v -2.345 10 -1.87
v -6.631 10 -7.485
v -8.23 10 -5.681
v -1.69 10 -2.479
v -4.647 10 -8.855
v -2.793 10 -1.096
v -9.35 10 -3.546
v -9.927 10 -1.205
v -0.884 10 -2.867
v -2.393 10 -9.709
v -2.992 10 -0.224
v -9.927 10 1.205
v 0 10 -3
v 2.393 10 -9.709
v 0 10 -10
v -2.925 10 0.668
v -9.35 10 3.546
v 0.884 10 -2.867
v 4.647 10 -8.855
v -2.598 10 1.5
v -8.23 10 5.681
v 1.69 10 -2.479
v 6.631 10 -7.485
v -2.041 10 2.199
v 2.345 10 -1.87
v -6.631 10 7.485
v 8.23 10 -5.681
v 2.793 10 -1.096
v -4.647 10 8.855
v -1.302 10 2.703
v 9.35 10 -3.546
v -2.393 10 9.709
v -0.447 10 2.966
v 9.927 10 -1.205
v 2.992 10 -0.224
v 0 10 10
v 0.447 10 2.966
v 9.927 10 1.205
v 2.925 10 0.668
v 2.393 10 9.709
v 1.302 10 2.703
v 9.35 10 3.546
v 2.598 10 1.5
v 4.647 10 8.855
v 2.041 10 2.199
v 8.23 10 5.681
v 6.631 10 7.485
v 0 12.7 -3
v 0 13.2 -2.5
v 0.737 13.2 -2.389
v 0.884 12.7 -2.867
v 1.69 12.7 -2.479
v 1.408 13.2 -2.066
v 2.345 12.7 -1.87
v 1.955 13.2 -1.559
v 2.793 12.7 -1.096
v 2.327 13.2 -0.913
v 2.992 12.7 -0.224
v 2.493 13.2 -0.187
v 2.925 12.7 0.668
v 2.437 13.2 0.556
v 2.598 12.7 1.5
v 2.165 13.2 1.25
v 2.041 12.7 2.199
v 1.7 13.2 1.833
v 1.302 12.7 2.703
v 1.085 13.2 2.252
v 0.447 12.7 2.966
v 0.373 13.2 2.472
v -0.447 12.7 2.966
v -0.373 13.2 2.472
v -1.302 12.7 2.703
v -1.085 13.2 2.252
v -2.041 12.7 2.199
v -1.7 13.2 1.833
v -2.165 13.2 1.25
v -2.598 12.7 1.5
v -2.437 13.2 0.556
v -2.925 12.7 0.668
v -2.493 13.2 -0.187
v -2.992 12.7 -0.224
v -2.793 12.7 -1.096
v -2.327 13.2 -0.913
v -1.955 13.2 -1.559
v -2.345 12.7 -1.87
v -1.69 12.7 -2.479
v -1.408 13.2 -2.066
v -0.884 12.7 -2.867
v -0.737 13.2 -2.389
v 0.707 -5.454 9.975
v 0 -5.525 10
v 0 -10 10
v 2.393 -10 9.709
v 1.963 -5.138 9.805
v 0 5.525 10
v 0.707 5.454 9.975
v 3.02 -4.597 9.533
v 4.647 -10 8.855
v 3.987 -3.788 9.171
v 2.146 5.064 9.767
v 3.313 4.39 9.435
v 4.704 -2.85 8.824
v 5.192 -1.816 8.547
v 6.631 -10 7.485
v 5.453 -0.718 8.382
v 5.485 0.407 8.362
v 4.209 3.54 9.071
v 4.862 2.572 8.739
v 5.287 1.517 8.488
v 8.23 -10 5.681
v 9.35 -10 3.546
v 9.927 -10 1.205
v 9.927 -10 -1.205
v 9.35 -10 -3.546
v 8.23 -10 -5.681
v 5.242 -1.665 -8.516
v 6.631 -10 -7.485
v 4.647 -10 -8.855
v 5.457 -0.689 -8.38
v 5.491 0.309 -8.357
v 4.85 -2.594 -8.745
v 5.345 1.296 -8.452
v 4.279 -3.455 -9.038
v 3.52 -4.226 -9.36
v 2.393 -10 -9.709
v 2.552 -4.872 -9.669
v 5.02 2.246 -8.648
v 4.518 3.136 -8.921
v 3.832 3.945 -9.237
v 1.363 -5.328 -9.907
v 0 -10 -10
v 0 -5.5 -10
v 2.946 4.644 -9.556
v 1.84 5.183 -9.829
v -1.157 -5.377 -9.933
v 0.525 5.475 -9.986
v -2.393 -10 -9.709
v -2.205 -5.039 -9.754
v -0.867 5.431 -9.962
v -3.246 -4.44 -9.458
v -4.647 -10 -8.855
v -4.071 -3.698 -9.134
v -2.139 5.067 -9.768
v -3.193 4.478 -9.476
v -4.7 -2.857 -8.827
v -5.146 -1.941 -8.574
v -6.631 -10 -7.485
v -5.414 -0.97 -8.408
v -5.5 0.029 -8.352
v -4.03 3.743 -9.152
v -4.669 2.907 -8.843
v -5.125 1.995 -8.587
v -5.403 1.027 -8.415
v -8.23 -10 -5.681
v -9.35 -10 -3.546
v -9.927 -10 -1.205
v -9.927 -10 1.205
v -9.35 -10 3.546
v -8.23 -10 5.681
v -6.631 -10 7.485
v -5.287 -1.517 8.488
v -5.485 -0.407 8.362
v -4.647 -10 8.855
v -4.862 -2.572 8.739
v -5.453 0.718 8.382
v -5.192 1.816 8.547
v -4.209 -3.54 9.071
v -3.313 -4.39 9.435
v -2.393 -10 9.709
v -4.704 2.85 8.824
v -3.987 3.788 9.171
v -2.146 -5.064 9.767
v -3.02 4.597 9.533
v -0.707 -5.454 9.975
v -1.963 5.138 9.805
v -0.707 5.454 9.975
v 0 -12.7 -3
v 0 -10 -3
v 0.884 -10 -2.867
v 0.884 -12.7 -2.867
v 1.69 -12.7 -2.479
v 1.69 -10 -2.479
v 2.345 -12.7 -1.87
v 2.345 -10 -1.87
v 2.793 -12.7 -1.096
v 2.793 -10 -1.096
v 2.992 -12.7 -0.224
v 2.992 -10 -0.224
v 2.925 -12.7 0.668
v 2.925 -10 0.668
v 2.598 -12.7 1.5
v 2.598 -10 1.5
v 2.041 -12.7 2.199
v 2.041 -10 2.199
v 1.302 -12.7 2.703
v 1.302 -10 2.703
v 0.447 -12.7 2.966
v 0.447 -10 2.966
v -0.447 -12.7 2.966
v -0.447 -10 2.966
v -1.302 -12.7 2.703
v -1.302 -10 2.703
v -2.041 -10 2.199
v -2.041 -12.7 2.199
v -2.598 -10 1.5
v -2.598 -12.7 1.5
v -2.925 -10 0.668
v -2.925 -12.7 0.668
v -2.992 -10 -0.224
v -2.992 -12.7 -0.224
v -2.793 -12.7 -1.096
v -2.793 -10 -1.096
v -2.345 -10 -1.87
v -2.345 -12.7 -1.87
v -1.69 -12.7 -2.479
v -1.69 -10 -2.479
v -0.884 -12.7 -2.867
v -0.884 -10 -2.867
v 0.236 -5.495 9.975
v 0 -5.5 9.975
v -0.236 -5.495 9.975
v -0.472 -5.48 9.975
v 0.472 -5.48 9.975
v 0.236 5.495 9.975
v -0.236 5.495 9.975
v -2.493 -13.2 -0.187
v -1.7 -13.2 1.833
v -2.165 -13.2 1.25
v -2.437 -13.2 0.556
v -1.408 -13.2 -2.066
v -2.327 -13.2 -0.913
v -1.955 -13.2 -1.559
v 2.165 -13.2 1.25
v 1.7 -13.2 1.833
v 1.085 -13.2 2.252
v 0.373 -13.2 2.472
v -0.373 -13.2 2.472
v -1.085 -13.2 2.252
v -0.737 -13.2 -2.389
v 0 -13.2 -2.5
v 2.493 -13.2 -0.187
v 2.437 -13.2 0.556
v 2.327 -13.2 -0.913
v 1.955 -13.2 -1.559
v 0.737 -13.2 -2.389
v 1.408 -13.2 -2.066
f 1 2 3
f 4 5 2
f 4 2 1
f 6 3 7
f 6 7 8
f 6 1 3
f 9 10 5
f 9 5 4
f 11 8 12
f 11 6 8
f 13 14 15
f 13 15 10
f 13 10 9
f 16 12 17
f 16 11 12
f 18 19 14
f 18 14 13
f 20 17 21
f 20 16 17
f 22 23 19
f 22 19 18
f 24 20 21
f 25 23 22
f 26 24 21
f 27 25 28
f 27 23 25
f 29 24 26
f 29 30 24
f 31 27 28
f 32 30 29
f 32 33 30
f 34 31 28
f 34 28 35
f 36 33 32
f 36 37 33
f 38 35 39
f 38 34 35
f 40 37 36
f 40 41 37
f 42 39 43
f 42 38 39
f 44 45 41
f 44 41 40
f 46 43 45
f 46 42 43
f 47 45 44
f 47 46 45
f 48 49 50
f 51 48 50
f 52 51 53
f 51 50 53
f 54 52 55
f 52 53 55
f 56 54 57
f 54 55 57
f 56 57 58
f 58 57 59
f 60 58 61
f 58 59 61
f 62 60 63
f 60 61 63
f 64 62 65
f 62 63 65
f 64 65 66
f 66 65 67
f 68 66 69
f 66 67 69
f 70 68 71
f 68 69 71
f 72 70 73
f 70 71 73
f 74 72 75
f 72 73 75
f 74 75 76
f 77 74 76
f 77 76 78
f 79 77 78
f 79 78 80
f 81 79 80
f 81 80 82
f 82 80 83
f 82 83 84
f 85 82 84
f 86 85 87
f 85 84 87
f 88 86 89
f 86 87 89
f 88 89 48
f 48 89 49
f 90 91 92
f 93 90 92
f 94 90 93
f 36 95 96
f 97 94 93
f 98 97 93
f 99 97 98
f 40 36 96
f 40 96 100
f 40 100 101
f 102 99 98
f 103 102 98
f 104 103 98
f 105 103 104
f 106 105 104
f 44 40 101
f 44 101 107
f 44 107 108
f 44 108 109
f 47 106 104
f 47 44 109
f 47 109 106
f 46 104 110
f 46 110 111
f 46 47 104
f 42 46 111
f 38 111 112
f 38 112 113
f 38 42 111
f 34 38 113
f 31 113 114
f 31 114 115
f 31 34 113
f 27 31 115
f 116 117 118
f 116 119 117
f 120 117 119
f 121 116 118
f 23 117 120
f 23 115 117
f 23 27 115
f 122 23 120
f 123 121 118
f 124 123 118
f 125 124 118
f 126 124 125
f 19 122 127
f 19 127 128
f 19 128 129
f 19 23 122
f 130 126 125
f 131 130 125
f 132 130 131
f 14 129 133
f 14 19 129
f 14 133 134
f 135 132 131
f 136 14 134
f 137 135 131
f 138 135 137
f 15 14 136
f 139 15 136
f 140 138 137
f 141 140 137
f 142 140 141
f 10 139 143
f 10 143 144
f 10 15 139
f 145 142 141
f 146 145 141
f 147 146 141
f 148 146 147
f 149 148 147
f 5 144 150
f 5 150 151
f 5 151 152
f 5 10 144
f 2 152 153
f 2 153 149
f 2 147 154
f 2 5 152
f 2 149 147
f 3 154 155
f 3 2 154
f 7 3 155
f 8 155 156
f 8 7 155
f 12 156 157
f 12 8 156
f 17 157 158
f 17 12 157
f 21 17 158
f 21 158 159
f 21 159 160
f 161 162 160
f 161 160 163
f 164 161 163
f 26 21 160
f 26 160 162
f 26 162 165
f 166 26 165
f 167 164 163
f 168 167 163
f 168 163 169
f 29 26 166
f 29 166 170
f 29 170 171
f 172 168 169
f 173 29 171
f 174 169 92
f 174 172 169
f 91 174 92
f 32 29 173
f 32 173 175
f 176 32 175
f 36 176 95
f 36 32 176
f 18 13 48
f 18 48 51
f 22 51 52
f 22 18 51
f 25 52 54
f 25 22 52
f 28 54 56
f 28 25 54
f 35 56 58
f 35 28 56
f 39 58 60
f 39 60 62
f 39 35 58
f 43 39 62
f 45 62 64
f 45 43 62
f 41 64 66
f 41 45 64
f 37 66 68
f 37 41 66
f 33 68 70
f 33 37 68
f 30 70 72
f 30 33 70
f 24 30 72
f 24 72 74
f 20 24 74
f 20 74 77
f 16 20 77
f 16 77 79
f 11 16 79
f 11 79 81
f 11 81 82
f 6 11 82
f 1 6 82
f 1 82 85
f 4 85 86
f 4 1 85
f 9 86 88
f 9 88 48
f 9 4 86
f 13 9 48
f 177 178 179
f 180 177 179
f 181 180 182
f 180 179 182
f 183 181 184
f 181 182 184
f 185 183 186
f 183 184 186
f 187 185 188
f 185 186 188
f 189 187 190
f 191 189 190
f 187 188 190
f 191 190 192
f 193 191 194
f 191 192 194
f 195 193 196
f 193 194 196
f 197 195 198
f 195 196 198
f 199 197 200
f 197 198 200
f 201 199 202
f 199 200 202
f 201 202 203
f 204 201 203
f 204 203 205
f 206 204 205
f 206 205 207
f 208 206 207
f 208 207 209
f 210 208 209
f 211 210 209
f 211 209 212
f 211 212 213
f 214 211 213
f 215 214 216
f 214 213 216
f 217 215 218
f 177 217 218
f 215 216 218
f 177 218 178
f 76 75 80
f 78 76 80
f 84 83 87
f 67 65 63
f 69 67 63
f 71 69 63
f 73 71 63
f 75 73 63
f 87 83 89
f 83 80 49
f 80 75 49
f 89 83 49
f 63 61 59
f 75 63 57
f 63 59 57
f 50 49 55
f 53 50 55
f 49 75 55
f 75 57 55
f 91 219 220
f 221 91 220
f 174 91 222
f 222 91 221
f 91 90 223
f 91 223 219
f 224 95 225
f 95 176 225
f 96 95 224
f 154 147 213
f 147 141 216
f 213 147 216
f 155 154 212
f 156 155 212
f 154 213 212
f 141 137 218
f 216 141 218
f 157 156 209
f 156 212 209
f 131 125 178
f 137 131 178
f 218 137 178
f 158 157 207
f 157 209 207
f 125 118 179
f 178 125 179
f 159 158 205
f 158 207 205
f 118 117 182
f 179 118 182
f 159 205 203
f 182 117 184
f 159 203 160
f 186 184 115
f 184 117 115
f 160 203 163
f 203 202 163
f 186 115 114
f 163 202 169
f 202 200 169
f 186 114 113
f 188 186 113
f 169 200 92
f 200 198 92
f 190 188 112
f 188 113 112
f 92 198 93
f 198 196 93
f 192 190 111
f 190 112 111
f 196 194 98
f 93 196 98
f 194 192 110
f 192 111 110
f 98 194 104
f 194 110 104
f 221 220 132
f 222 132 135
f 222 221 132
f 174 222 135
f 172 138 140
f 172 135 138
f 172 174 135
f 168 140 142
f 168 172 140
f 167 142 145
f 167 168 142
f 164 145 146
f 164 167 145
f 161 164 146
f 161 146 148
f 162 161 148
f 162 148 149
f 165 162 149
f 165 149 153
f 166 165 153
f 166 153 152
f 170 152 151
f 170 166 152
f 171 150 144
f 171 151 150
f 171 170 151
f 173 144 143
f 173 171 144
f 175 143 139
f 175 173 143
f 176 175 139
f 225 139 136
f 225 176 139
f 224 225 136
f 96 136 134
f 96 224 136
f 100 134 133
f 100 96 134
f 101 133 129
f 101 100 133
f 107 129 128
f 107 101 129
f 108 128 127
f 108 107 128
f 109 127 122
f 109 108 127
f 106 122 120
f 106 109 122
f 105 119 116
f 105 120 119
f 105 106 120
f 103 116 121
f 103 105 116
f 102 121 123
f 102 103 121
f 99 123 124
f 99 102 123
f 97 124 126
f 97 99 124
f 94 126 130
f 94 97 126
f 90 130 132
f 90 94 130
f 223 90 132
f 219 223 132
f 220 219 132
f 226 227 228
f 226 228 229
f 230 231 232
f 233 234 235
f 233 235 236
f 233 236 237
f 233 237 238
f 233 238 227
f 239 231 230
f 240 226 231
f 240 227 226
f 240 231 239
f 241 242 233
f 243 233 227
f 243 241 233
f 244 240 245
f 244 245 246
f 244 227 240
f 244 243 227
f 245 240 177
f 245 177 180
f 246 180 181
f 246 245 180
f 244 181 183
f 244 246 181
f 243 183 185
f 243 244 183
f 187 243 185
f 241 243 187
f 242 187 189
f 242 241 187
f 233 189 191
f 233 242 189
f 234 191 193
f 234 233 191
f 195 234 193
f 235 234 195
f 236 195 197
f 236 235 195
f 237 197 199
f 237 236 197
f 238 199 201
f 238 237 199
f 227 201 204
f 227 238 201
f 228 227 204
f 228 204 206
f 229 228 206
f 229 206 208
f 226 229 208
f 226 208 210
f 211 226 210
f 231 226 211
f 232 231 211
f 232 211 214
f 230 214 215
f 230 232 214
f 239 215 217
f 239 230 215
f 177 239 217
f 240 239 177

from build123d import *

# Parameters (mm, degrees)
SCHIZZO1_R                   = 10
ESTRUSIONE_ESTRUSIONE1_DEPTH = 10
SCHIZZO2_R                   = 3
ESTRUSIONE_ESTRUSIONE2_DEPTH = 3.2
SMUSSO1_SIZE                 = 0.5


with BuildPart() as part:
    # Schizzo1 → Estrusione-Estrusione1 (new, symmetric)
    with BuildSketch(Plane(origin=(0, 0, 0), x_dir=(1, 0, 0), z_dir=(0, 1, 0))):
        with Locations(Location((0, 0, 0), (0, 0, 270))):
            Circle(SCHIZZO1_R)
    extrude(amount=ESTRUSIONE_ESTRUSIONE1_DEPTH, both=True)

    # Schizzo2 → Estrusione-Estrusione2 (add)
    with BuildSketch(Plane.XZ.offset(10)):
        with Locations(Location((0, 0, 0), (0, 0, 270))):
            Circle(SCHIZZO2_R)
    estrusione_estrusione2 = extrude(amount=ESTRUSIONE_ESTRUSIONE2_DEPTH)

    # Specchia1: Estrusione-Estrusione2 across plane
    add(estrusione_estrusione2.mirror(Plane.ZX))

    # Schizzo8 → Foro per Vite M10-1 (revolve, cut)
    with BuildSketch(Plane(origin=(0, 0, 10), x_dir=(0, -1, 0), z_dir=(1, 0, 0))):
        Polygon((0, 0), (0, 20), (5.5, 20), (5.5, 0.025), (5.525, 0), align=None)
    revolve(axis=Axis((0, 0, 16.35), (0, 0, -1)), mode=Mode.SUBTRACT)

    # Smusso1
    smusso1_edges = [part.edges().sort_by_distance(p)[0] for p in [
        (0, 13.2, 3),
        (0, -13.2, 3),
    ]]
    chamfer(smusso1_edges, length=SMUSSO1_SIZE)


solid = part.part
